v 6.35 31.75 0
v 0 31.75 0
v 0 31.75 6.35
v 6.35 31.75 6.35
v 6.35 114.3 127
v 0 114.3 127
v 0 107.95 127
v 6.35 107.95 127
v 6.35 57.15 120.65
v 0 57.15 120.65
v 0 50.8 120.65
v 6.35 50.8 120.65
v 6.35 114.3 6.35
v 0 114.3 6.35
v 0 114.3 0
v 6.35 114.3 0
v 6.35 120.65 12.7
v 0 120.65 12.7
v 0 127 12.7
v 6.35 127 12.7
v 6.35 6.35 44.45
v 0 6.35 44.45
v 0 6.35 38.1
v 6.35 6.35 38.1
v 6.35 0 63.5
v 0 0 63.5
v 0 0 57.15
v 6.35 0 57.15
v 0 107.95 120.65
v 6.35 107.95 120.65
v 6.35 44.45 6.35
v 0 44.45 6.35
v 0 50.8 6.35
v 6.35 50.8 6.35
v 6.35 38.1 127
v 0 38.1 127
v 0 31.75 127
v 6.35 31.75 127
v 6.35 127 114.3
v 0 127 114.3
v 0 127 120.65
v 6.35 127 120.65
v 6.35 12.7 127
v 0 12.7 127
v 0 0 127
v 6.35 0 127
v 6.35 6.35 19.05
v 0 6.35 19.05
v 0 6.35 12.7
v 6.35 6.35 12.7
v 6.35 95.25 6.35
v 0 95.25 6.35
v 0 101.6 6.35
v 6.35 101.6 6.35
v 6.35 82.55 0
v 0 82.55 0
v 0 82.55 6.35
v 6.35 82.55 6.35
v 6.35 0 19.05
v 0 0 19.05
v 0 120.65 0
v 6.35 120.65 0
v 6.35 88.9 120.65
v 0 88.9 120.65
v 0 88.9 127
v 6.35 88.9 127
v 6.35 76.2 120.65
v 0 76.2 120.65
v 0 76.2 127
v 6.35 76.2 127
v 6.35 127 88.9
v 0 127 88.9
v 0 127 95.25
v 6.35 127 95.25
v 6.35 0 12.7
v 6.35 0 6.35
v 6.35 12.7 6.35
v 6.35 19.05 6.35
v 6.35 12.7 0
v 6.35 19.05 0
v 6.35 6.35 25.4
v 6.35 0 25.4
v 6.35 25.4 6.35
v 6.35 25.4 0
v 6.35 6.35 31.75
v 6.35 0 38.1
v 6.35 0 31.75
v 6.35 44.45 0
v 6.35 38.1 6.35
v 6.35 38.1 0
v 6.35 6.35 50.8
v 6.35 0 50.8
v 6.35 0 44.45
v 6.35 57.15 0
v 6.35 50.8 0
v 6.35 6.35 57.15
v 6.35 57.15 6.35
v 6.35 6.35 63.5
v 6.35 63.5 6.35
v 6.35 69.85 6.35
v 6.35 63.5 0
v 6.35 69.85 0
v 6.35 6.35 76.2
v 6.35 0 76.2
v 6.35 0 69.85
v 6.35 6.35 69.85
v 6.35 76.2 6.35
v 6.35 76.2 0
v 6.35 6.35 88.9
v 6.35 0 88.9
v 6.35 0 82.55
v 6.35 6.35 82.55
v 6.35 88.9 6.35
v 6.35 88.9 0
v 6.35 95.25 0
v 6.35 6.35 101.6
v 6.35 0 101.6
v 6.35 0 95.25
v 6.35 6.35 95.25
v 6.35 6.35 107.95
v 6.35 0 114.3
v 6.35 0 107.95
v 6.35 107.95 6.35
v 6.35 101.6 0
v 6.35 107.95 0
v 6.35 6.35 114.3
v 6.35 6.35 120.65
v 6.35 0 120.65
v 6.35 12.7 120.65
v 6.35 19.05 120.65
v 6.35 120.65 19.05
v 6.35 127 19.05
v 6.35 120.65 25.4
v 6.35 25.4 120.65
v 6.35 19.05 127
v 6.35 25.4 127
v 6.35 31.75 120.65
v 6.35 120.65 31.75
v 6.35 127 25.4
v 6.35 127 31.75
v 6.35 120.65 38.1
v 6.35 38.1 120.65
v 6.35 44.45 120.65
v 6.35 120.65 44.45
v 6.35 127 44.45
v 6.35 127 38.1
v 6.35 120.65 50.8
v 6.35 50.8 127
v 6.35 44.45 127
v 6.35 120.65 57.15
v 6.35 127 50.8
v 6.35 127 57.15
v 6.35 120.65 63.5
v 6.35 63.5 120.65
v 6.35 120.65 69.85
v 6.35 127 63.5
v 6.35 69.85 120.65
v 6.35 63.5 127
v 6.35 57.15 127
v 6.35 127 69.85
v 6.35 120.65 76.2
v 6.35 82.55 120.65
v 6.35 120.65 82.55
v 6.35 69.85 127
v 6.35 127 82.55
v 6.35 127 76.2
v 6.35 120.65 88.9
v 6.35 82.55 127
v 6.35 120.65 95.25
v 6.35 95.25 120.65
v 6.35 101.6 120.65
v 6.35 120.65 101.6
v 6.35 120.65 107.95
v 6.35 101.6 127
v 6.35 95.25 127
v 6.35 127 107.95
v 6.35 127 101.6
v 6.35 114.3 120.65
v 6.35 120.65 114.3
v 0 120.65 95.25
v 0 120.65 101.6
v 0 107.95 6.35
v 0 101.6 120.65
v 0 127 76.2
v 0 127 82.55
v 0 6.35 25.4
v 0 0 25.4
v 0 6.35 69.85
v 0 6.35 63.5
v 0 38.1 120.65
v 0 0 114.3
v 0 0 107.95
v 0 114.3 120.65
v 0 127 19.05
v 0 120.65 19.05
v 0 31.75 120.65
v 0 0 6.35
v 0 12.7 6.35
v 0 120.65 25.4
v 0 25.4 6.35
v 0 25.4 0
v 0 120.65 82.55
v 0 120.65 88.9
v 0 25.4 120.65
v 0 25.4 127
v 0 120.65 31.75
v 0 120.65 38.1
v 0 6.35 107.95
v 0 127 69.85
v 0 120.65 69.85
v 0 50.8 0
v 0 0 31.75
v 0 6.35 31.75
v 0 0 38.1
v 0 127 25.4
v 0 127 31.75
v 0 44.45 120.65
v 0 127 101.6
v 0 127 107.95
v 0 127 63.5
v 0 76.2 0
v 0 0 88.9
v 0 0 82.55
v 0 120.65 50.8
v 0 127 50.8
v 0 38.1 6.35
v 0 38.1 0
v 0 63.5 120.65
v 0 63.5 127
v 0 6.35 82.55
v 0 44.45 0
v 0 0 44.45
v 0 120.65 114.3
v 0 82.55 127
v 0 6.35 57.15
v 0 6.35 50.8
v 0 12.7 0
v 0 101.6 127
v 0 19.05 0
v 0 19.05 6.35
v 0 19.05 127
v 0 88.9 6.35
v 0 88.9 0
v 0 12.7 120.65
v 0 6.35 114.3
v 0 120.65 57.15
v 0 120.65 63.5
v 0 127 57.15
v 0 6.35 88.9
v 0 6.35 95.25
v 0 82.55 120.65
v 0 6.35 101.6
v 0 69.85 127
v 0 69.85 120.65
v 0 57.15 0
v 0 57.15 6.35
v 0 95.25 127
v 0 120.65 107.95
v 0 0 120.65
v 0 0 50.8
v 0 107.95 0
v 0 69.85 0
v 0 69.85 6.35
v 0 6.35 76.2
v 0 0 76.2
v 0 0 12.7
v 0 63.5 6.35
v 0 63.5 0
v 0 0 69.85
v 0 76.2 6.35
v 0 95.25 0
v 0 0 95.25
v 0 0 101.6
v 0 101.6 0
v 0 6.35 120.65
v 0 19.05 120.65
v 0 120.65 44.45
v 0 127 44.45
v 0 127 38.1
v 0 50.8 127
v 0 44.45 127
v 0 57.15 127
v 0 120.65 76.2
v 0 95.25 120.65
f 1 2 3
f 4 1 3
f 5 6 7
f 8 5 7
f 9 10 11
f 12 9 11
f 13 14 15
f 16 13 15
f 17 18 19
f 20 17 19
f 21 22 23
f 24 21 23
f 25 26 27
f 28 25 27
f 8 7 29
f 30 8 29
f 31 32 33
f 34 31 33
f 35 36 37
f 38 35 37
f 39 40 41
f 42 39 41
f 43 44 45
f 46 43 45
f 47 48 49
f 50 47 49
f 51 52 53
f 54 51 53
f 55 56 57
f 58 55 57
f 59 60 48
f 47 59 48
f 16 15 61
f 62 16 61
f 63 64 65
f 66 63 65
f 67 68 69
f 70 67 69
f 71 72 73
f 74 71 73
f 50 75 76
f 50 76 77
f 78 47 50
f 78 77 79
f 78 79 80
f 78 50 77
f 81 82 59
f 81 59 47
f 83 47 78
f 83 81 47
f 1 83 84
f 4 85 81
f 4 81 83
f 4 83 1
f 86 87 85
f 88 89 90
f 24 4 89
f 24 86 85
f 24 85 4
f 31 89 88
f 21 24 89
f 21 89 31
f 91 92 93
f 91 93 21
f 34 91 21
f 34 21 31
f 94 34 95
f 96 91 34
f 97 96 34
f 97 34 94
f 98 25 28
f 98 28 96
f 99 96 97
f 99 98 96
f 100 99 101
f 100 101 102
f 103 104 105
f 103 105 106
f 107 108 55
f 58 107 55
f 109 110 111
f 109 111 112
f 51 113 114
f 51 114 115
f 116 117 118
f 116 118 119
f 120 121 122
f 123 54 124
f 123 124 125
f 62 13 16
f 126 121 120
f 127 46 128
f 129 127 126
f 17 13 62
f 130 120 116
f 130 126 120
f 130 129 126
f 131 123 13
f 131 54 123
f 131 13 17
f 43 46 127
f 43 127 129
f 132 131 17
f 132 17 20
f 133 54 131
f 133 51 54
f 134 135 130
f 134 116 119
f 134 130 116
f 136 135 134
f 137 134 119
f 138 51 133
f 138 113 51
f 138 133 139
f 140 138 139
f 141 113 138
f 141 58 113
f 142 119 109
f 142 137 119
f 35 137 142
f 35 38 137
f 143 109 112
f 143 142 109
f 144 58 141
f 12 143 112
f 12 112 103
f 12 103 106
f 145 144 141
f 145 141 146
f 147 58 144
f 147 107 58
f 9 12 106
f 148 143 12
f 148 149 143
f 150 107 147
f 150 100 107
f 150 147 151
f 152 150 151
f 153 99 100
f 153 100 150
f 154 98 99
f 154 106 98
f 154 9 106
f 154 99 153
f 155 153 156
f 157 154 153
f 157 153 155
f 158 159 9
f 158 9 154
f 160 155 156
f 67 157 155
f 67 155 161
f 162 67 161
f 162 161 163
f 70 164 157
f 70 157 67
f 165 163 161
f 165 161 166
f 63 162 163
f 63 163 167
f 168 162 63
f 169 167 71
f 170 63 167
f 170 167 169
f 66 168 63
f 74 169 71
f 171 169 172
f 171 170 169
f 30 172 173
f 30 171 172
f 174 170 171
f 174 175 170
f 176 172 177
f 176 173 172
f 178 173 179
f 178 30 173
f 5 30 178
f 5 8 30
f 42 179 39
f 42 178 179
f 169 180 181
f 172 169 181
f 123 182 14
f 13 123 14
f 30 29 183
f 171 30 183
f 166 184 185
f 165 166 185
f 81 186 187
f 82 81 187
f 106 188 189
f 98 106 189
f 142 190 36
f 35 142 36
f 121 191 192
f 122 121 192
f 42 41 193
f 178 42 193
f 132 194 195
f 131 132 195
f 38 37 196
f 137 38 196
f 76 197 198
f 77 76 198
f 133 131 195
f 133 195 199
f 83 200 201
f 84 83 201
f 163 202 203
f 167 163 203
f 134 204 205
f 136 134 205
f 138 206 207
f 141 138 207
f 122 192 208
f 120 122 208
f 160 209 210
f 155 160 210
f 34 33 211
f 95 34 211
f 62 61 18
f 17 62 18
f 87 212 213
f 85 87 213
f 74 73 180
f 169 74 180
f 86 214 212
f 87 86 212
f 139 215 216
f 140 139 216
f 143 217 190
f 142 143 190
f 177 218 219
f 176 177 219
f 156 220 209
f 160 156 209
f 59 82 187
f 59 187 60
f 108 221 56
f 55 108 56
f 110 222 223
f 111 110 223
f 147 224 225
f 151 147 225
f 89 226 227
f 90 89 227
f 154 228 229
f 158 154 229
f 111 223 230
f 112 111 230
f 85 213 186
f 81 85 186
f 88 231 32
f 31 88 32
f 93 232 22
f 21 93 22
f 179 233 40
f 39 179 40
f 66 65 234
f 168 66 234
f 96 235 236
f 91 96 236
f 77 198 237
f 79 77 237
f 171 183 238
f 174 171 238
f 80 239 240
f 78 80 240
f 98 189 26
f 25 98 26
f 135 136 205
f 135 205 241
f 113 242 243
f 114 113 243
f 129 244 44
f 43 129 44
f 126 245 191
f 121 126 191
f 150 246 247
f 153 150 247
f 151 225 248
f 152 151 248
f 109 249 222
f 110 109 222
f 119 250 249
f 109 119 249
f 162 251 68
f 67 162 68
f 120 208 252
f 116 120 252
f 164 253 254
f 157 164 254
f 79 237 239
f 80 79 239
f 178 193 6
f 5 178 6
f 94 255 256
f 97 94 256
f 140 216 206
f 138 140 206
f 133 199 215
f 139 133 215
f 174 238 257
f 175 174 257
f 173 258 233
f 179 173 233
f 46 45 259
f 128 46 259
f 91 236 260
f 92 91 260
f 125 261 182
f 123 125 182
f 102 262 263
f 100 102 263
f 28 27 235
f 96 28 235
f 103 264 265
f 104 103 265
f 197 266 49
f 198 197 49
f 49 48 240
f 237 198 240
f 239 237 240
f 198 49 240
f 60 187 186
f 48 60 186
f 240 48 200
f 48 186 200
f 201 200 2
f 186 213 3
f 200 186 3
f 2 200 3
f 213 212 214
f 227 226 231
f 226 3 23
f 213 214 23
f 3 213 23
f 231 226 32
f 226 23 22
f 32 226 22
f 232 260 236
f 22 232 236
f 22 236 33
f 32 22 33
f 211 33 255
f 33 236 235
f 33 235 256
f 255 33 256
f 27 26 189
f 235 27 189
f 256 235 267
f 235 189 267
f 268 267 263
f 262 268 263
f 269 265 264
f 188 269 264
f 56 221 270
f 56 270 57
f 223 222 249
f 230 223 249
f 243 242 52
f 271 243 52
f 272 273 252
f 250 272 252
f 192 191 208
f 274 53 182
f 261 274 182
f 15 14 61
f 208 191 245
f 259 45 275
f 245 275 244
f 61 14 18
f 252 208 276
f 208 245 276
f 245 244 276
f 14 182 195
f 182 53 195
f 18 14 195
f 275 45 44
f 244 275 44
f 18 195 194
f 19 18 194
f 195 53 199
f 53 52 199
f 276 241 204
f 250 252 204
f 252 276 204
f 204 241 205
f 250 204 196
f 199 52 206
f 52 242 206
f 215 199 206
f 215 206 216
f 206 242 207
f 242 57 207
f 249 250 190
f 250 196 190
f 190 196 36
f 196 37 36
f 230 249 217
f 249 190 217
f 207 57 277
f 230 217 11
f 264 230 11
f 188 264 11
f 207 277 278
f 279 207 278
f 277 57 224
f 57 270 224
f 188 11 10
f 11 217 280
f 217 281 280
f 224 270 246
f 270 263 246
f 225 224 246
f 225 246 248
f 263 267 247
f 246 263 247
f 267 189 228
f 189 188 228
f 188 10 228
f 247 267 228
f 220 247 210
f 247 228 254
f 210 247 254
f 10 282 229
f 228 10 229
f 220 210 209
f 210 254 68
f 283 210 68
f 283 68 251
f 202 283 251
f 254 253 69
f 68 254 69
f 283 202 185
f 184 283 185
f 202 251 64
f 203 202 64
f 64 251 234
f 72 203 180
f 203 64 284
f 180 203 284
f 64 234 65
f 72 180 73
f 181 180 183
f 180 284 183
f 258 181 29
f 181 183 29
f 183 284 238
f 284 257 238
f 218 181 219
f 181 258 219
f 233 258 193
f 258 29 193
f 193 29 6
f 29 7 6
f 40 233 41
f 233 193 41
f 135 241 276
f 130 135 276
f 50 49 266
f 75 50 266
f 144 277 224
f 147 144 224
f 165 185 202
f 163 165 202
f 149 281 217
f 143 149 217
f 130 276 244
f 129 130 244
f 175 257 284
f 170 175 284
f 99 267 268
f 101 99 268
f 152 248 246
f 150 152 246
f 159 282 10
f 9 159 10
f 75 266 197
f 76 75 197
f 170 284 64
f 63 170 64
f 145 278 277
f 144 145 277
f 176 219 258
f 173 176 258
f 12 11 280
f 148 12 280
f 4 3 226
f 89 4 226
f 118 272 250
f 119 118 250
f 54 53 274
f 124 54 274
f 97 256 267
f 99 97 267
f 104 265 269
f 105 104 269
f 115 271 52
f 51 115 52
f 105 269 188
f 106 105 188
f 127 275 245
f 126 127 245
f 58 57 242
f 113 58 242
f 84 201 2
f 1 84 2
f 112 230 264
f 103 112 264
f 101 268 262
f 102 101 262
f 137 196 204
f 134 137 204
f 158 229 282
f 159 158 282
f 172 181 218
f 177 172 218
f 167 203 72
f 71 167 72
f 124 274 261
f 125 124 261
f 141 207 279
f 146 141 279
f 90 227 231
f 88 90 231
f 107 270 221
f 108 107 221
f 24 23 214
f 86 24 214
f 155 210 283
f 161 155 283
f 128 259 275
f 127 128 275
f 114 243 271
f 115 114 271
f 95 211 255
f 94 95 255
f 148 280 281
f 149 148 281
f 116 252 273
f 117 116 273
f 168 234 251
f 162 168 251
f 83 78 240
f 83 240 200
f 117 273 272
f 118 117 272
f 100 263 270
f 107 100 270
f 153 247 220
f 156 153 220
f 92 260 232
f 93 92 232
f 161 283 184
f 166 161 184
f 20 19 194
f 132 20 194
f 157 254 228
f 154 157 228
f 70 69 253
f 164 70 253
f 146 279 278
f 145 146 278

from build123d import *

# Parameters (mm, degrees)
F1_DEPTH = 6.35


# Not quite as in the source:
# - a feature names something its author has since deleted; it is built from what else it names


with BuildPart() as f1:
    # F0 (on Right) → F1 (new body)
    with BuildSketch(Plane.YZ):
        Polygon((12.7, 127), (6.35, 127), (0, 127), (0, 120.65), (6.35, 120.65), (6.35, 114.3), (0, 114.3), (0, 107.95), (6.35, 107.95), (6.35, 101.6), (0, 101.6), (0, 95.25), (6.35, 95.25), (6.35, 88.9), (0, 88.9), (0, 82.55), (6.35, 82.55), (6.35, 76.2), (0, 76.2), (0, 69.85), (6.35, 69.85), (6.35, 63.5), (0, 63.5), (0, 57.15), (6.35, 57.15), (6.35, 50.8), (0, 50.8), (0, 44.45), (6.35, 44.45), (6.35, 38.1), (0, 38.1), (0, 31.75), (6.35, 31.75), (6.35, 25.4), (0, 25.4), (0, 19.05), (6.35, 19.05), (6.35, 12.7), (0, 12.7), (0, 6.35), (6.35, 6.35), (12.7, 6.35), (12.7, 0), (19.05, 0), (19.05, 6.35), (25.4, 6.35), (25.4, 0), (31.75, 0), (31.75, 6.35), (38.1, 6.35), (38.1, 0), (44.45, 0), (44.45, 6.35), (50.8, 6.35), (50.8, 0), (57.15, 0), (57.15, 6.35), (63.5, 6.35), (63.5, 0), (69.85, 0), (69.85, 6.35), (76.2, 6.35), (76.2, 0), (82.55, 0), (82.55, 6.35), (88.9, 6.35), (88.9, 0), (95.25, 0), (95.25, 6.35), (101.6, 6.35), (101.6, 0), (107.95, 0), (107.95, 6.35), (114.3, 6.35), (114.3, 0), (120.65, 0), (120.65, 6.35), (120.65, 12.7), (127, 12.7), (127, 19.05), (120.65, 19.05), (120.65, 25.4), (127, 25.4), (127, 31.75), (120.65, 31.75), (120.65, 38.1), (127, 38.1), (127, 44.45), (120.65, 44.45), (120.65, 50.8), (127, 50.8), (127, 57.15), (120.65, 57.15), (120.65, 63.5), (127, 63.5), (127, 69.85), (120.65, 69.85), (120.65, 76.2), (127, 76.2), (127, 82.55), (120.65, 82.55), (120.65, 88.9), (127, 88.9), (127, 95.25), (120.65, 95.25), (120.65, 101.6), (127, 101.6), (127, 107.95), (120.65, 107.95), (120.65, 114.3), (127, 114.3), (127, 120.65), (120.65, 120.65), (114.3, 120.65), (114.3, 127), (107.95, 127), (107.95, 120.65), (101.6, 120.65), (101.6, 127), (95.25, 127), (95.25, 120.65), (88.9, 120.65), (88.9, 127), (82.55, 127), (82.55, 120.65), (76.2, 120.65), (76.2, 127), (69.85, 127), (69.85, 120.65), (63.5, 120.65), (63.5, 127), (57.15, 127), (57.15, 120.65), (50.8, 120.65), (50.8, 127), (44.45, 127), (44.45, 120.65), (38.1, 120.65), (38.1, 127), (31.75, 127), (31.75, 120.65), (25.4, 120.65), (25.4, 127), (19.05, 127), (19.05, 120.65), (12.7, 120.65), align=None)
    extrude(amount=F1_DEPTH)


solid = f1.part
